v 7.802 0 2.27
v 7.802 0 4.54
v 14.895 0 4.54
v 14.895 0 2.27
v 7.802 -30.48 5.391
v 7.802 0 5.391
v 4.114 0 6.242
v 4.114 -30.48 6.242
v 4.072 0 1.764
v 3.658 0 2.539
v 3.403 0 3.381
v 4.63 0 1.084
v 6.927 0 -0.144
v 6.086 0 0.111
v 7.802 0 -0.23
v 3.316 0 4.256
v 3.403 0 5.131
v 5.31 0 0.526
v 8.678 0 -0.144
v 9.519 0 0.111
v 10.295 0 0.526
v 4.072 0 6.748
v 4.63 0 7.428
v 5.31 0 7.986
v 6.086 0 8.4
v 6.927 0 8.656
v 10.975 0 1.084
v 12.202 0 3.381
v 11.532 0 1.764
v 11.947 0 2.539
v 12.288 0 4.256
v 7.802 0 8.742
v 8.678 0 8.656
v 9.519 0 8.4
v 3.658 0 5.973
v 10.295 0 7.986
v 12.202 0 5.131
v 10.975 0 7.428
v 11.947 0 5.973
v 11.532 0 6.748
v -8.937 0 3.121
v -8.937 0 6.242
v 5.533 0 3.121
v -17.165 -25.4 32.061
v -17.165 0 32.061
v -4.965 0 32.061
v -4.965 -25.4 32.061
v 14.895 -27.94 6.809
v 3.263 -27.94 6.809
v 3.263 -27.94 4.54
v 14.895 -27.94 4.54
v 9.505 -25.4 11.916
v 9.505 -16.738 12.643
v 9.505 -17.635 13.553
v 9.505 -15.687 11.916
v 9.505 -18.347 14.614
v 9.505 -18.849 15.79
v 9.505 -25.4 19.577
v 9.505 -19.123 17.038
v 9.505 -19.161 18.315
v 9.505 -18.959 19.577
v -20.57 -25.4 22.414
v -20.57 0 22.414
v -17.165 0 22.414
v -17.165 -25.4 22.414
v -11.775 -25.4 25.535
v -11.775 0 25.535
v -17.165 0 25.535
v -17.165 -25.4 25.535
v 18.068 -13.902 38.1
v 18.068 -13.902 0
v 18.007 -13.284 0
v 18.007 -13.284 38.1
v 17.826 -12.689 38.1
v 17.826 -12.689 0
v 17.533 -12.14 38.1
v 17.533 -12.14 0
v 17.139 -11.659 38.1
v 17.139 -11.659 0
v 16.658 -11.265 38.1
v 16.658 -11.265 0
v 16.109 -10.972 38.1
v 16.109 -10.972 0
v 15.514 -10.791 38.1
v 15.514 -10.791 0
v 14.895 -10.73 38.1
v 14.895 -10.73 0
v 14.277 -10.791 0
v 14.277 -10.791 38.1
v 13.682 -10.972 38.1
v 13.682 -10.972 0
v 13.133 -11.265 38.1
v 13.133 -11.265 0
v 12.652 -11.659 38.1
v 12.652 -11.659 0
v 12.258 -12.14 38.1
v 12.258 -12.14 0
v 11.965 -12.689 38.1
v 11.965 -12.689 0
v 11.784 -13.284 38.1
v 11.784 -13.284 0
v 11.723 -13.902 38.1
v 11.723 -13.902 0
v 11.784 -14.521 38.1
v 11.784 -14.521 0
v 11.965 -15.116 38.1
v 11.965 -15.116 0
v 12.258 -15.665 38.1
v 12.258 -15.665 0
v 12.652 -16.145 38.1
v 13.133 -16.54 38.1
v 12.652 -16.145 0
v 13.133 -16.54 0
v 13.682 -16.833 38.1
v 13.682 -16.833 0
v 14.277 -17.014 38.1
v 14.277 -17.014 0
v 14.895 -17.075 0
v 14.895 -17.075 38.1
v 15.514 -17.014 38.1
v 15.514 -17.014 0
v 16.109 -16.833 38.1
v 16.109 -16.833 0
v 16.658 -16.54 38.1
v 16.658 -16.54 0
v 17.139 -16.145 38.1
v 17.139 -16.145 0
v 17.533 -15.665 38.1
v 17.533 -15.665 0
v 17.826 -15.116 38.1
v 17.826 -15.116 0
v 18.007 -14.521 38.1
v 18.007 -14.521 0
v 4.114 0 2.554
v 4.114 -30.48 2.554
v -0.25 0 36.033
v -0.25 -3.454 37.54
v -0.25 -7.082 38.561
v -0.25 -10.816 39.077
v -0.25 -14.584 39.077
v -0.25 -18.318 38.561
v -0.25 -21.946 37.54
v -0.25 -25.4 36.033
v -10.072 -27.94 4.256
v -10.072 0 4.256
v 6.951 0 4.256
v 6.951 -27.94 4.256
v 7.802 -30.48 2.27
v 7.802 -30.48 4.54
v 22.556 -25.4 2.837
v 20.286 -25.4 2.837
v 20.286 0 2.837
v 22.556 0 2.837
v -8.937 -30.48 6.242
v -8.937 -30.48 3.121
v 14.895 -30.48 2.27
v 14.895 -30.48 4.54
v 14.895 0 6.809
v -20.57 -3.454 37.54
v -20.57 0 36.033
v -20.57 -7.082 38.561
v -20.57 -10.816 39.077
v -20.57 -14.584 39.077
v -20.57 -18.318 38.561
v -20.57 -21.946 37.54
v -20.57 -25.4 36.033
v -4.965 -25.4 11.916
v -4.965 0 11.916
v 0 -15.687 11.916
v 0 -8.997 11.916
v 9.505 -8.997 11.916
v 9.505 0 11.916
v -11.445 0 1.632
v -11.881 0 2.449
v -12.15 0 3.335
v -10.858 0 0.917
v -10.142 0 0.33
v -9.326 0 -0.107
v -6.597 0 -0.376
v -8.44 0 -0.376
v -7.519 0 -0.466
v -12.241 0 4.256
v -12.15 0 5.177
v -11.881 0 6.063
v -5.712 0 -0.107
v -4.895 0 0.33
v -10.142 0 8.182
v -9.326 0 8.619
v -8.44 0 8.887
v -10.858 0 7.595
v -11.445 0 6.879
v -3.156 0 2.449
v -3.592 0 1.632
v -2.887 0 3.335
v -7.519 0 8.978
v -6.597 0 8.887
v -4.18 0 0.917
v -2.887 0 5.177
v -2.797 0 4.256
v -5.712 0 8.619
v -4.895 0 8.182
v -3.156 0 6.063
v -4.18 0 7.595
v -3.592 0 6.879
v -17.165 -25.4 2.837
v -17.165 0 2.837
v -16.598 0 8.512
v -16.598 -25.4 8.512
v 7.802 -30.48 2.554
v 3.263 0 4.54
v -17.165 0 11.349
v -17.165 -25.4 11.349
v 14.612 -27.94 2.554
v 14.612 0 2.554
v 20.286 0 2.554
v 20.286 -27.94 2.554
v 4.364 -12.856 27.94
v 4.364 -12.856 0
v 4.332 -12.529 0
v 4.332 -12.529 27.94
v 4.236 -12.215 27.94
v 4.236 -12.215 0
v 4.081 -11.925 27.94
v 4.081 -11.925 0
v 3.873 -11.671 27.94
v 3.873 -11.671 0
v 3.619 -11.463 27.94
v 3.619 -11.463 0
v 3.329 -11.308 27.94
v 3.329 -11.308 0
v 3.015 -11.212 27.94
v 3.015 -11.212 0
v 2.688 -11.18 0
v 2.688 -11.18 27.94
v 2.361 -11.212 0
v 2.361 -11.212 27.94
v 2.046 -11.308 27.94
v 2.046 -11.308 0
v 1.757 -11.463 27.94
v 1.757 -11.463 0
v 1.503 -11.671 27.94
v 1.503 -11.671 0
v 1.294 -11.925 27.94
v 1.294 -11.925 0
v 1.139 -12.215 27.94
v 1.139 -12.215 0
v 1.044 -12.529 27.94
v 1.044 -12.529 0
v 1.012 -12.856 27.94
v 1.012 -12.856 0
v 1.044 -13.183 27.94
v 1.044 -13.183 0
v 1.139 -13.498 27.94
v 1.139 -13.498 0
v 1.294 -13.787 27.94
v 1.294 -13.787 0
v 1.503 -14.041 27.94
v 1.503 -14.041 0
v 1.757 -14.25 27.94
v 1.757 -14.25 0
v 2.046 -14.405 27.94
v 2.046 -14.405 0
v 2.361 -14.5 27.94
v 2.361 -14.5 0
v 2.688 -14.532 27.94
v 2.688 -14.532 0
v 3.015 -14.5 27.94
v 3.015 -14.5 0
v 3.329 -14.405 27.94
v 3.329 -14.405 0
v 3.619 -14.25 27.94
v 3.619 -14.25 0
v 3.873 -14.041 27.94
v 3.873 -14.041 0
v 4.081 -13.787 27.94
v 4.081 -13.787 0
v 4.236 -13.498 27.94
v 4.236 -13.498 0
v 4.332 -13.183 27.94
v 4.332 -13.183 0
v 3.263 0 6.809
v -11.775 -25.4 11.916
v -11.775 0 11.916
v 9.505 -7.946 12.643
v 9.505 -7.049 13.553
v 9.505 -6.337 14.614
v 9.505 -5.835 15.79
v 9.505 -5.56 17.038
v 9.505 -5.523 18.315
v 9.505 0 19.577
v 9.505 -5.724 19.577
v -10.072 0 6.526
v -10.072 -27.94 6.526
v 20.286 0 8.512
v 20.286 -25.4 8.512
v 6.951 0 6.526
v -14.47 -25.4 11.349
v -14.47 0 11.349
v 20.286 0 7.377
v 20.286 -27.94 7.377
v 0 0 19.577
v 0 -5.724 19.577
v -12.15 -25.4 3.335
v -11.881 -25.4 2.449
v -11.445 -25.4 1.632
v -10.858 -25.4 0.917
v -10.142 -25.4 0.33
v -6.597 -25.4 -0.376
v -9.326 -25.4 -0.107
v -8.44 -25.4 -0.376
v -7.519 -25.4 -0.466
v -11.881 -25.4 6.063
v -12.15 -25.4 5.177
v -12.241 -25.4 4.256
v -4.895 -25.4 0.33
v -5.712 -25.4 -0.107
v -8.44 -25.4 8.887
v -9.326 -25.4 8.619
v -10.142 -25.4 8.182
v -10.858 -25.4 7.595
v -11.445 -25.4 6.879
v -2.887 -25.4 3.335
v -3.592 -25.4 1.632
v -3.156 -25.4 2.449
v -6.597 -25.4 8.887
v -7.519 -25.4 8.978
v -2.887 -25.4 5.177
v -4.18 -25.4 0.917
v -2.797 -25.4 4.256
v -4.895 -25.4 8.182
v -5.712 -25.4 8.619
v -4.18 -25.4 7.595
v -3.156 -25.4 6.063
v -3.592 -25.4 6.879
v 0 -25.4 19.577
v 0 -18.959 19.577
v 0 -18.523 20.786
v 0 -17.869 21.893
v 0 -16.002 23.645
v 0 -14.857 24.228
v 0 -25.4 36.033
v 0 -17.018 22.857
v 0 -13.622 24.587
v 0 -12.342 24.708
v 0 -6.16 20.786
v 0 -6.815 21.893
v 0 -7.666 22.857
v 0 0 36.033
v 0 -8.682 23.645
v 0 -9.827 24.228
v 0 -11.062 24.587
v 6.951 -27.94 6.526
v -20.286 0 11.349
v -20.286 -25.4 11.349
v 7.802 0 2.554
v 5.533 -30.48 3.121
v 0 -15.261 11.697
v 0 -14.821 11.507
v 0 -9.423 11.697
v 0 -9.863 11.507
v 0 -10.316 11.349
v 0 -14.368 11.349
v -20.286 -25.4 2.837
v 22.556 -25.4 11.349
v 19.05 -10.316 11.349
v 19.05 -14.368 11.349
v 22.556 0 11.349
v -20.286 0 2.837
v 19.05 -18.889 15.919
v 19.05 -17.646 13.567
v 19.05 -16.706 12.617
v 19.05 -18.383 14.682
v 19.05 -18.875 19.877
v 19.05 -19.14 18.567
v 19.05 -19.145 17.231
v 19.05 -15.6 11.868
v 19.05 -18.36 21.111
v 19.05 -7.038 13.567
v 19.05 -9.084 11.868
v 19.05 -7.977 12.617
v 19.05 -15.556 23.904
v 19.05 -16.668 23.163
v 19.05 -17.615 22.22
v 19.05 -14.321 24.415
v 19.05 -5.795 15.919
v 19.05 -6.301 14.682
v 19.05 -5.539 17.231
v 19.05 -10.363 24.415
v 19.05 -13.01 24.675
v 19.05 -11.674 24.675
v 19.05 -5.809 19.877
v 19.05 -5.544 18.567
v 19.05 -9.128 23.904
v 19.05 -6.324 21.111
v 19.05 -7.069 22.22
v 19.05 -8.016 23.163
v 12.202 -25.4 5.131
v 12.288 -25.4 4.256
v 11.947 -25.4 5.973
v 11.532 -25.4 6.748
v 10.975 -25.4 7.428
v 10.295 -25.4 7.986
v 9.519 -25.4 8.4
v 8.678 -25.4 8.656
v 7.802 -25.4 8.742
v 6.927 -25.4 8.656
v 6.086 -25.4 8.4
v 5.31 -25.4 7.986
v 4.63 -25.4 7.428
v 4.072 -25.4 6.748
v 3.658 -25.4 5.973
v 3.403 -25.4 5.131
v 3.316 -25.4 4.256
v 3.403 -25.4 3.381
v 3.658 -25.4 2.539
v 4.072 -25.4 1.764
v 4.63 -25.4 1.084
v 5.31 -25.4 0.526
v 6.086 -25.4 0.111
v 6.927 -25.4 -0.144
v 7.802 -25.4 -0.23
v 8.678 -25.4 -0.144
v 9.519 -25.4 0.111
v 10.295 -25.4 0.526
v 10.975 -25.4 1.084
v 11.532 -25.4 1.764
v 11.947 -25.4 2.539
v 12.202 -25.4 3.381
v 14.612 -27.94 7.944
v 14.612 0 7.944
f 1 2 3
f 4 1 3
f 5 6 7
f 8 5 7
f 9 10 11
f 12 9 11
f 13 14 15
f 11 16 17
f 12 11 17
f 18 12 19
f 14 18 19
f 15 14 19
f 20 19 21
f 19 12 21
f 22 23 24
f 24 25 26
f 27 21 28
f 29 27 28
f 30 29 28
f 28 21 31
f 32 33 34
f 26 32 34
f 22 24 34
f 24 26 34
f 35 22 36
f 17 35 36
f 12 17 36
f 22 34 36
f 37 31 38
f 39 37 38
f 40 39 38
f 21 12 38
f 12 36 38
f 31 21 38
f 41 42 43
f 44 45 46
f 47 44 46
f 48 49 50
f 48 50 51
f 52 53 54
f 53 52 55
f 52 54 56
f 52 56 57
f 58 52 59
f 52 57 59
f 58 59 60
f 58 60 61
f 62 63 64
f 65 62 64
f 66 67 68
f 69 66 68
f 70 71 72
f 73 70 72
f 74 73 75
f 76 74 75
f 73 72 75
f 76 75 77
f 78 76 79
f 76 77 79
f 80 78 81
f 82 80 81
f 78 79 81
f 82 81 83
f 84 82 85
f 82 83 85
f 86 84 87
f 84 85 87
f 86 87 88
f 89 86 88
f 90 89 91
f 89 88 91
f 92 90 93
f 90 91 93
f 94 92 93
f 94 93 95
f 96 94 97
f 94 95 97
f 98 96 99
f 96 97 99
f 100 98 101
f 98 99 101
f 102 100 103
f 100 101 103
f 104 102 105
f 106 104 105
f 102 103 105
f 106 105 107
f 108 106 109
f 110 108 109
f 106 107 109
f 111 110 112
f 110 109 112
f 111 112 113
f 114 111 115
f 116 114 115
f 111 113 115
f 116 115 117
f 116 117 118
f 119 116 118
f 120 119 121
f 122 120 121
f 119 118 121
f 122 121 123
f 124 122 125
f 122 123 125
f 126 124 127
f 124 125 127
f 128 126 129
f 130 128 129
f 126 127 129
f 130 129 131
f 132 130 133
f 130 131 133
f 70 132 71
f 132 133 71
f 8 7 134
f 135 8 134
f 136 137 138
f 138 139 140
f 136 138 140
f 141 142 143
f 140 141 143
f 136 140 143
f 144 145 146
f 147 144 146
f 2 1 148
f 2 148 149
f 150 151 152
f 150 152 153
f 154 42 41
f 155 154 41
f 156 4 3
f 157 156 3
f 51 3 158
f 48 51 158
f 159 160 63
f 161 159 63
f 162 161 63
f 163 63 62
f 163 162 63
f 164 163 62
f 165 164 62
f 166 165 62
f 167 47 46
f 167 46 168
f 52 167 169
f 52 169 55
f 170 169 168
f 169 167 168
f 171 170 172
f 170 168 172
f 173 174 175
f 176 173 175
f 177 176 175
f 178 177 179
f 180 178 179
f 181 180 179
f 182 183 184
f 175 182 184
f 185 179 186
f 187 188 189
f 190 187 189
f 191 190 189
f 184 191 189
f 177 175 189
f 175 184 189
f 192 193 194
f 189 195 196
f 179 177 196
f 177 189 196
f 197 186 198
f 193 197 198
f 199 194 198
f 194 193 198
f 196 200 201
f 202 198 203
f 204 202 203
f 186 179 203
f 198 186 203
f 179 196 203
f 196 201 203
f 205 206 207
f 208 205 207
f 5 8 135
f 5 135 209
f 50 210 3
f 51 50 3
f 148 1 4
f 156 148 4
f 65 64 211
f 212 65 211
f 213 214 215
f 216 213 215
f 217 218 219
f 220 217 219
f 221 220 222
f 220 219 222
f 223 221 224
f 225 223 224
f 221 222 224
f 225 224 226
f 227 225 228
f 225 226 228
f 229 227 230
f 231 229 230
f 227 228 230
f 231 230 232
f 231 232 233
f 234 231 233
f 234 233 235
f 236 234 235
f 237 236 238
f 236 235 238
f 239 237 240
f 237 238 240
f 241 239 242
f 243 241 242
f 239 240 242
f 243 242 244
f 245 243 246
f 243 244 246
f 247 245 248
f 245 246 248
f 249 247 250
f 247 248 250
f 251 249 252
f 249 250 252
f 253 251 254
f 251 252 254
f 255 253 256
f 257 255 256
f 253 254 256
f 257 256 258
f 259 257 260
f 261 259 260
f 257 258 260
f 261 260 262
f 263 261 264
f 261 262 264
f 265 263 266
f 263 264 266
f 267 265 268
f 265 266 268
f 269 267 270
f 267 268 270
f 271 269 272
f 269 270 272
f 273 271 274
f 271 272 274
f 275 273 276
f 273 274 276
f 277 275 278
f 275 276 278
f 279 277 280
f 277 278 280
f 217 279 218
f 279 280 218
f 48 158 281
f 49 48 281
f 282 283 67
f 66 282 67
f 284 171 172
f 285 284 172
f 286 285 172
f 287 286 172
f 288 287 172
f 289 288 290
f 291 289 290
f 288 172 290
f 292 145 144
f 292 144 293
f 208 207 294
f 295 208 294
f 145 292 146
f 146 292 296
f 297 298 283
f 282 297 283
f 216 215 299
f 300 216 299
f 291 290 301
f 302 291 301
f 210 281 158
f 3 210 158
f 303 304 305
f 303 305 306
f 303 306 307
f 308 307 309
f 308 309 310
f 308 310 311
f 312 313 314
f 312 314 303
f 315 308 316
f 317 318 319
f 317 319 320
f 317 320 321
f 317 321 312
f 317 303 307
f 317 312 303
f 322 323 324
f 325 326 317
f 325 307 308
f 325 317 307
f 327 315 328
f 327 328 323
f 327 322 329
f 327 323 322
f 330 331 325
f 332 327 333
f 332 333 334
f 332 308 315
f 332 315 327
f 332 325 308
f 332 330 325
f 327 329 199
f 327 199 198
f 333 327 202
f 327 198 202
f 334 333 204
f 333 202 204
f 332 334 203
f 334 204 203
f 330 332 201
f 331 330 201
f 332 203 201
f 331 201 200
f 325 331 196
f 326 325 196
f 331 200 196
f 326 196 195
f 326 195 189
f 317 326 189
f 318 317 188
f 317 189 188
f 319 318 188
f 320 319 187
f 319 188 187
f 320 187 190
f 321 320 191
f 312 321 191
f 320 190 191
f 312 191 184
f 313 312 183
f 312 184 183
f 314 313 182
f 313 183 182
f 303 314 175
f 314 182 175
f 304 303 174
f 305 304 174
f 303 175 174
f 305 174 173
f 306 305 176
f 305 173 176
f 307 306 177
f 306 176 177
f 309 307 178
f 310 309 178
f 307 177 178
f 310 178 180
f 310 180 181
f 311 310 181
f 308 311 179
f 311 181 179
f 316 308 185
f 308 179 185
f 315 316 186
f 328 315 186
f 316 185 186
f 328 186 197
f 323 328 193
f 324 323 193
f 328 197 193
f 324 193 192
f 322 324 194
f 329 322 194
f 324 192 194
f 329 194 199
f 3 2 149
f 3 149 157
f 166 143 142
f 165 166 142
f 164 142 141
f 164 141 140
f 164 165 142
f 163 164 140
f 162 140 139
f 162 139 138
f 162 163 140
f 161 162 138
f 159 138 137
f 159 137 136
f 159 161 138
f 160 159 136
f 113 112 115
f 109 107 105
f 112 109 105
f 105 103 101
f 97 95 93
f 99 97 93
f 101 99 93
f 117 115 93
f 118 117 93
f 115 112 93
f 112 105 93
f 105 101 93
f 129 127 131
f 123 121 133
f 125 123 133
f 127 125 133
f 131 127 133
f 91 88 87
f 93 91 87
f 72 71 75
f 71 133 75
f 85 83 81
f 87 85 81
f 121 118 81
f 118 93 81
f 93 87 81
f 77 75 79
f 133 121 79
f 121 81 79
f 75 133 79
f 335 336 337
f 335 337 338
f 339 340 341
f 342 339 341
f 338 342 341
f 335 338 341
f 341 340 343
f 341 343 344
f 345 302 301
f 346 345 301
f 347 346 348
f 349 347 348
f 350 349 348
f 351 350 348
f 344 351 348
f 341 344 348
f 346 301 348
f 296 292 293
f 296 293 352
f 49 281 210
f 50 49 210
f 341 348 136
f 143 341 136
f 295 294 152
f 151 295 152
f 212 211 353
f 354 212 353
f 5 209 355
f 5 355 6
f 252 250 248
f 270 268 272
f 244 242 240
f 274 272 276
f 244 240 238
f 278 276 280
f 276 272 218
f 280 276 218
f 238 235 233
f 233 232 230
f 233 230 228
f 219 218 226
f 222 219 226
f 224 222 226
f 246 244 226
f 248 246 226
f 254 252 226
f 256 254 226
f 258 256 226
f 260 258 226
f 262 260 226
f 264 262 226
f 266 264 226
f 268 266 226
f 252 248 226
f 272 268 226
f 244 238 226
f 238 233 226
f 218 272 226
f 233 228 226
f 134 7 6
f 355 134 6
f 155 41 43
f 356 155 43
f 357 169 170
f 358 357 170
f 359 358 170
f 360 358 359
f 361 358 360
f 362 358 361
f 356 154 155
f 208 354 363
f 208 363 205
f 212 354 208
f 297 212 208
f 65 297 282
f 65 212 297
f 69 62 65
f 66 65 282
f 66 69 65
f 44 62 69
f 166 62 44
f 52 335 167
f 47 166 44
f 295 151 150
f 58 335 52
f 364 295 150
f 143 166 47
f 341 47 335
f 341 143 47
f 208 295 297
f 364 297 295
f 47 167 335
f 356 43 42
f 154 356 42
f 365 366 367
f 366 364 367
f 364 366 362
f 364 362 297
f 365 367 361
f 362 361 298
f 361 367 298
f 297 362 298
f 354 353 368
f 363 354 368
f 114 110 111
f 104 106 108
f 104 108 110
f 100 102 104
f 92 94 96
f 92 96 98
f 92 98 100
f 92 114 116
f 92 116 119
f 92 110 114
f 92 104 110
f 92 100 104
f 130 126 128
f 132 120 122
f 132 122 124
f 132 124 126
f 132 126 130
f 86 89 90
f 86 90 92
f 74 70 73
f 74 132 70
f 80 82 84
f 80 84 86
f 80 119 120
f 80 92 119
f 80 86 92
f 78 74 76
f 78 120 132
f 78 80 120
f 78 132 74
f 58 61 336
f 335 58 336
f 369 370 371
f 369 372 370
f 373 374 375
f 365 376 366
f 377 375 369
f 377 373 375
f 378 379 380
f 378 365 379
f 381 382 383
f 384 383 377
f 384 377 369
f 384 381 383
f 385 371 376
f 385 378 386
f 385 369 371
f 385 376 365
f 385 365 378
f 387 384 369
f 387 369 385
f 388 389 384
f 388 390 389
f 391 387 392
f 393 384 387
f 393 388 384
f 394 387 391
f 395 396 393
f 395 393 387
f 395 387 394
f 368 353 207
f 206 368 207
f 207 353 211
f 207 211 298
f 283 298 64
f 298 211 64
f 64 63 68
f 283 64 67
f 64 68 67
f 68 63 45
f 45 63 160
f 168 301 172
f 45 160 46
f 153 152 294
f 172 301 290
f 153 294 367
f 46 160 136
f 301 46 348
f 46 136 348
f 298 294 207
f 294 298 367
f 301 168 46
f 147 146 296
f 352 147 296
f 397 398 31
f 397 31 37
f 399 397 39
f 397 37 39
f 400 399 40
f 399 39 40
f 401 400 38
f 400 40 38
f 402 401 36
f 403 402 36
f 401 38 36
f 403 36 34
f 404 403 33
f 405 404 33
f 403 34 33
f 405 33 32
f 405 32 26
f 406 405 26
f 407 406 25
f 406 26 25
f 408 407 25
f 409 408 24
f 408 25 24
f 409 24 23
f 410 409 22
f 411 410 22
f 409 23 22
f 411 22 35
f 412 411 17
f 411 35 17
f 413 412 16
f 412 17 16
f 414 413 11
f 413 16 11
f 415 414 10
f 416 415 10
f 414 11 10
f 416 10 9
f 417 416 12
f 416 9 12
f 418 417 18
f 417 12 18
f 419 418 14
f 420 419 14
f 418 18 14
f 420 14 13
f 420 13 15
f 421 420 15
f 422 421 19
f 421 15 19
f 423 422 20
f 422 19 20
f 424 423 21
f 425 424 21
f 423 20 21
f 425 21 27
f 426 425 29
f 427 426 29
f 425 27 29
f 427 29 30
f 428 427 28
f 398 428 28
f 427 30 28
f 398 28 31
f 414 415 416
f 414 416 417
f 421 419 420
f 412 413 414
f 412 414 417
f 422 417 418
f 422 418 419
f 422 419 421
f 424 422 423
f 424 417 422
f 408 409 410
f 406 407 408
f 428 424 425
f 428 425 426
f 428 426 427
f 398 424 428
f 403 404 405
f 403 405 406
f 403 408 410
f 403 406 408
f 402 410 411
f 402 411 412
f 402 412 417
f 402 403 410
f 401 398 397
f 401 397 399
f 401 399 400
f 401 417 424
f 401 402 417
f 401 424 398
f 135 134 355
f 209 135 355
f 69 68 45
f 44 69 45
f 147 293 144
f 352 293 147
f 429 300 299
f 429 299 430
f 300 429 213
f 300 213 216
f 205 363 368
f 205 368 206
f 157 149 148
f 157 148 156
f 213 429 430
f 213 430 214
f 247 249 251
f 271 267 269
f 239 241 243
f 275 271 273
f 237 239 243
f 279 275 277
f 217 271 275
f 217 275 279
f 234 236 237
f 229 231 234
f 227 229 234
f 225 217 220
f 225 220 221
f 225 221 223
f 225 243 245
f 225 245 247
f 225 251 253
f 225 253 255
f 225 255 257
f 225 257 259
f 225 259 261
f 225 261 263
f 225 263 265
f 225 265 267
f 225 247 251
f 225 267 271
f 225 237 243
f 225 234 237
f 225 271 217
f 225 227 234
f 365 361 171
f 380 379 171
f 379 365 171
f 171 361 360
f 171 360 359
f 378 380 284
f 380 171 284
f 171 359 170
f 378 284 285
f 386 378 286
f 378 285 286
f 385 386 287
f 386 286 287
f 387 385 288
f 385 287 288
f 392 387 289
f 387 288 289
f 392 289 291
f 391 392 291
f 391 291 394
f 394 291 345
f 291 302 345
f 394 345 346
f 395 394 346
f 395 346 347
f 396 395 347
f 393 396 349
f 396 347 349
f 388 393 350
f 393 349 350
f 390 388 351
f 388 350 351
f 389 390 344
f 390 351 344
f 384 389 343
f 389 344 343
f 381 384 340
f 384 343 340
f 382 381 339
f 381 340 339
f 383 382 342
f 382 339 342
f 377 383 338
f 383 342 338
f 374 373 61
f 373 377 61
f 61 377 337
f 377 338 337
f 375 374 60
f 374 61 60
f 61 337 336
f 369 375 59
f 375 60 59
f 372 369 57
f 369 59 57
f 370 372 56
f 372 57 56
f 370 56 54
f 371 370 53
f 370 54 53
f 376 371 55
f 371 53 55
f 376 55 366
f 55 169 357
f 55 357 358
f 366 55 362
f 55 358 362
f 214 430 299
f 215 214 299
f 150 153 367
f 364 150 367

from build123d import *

# Parameters (mm, degrees)
F0_R      = 4.486061
F0_R_2    = 4.722098
F1_DEPTH  = 25.4
F3_DEPTH  = 25.4
F5_DEPTH  = 25.4
F6_R      = 6.832964
F7_DEPTH  = 19.05
F8_R      = 3.172124
F9_DEPTH  = 38.1
F11_DEPTH = 27.94
F12_W     = 17.023406
F12_H     = 2.269788
F13_DEPTH = 27.94
F15_DEPTH = 27.94
F17_DEPTH = 30.48
F18_W     = 7.093086
F18_H     = 2.269787
F19_DEPTH = 30.48
F21_DEPTH = 30.48
F22_R     = 1.676019
F23_DEPTH = 27.94
F25_DEPTH = 20.32


with BuildPart() as f1:
    # F0 (on Front) → F1 (new body)
    with BuildSketch(Plane.XZ):
        with Locations((7.802393, 4.255851)):
            Circle(F0_R)
        with Locations((-7.518671, 4.255851)):
            Circle(F0_R_2)
    extrude(amount=F1_DEPTH)


with BuildPart() as f3:
    # F2 (on Front) → F3 (new body)
    with BuildSketch(Plane.XZ):
        Polygon((-17.165266, 2.837234), (-16.59782, 8.511703), (20.286225, 8.511703), (20.286225, 2.837234), (22.556009, 2.837234), (22.556009, 11.348937), (-20.286223, 11.348937), (-20.286223, 2.837234), align=None)
    extrude(amount=F3_DEPTH)

    # F4 (on Front) → F5 (join)
    with BuildSketch(Plane.XZ):
        Polygon((-17.165266, 22.414148), (-17.165266, 10.781489), (-11.774521, 11.916383), (-11.774521, 25.535107), (-17.165266, 25.535107), (-17.165266, 32.060746), (-4.965159, 32.060746), (-4.965159, 11.916383), (9.504734, 11.916383), (9.504734, 19.576915), (0, 19.576915), (0, 36.032874), (-20.569947, 36.032874), (-20.569947, 22.414148), align=None)
    extrude(amount=F5_DEPTH)

    # F6 (on Right) → F7 (join)
    with BuildSketch(Plane.YZ):
        with Locations((-12.341968, 17.874574)):
            Circle(F6_R)
    extrude(amount=F7_DEPTH)

    # F24 (on face) → F25 (join)
    with BuildSketch(Plane(origin=(-20.569947, 0, 0), x_dir=(0, -1, 0), z_dir=(-1, 0, 0))):
        with BuildLine():
            Line((0, 36.032874), (25.4, 36.032874))
            ThreePointArc((25.4, 36.032874), (12.7, 39.141446), (0, 36.032874))
        make_face()
    extrude(amount=-F25_DEPTH)


with BuildPart() as f9:
    # F8 (on Top) → F9 (new body)
    with BuildSketch(Plane.XY):
        with Locations((14.895479, -13.902447)):
            Circle(F8_R)
    extrude(amount=F9_DEPTH)


with BuildPart() as f11:
    # F10 (on Front) → F11 (new body)
    with BuildSketch(Plane.XZ):
        Polygon((20.286225, 2.553511), (20.286225, 7.376809), (14.611756, 7.944255), (14.611756, 2.553511), align=None)
    extrude(amount=F11_DEPTH)


with BuildPart() as f13:
    # F12 (on Front) → F13 (new body)
    with BuildSketch(Plane.XZ):
        with Locations((-1.560478, 5.390745)):
            Rectangle(F12_W, F12_H)
    extrude(amount=F13_DEPTH)


with BuildPart() as f15:
    # F14 (on Front) → F15 (new body)
    with BuildSketch(Plane.XZ):
        Polygon((14.895479, 4.539574), (14.895479, 6.809362), (3.262819, 6.809362), (3.262819, 4.539574), (12.058245, 4.539574), align=None)
    extrude(amount=F15_DEPTH)


with BuildPart() as f17:
    # F16 (on Front) → F17 (new body)
    with BuildSketch(Plane.XZ):
        Polygon((7.802393, 5.390745), (4.11399, 6.241915), (4.11399, 2.553511), (7.802393, 2.553511), align=None)
    extrude(amount=F17_DEPTH)


with BuildPart() as f19:
    # F18 (on Front) → F19 (new body)
    with BuildSketch(Plane.XZ):
        with Locations((11.348936, 3.40468)):
            Rectangle(F18_W, F18_H)
    extrude(amount=F19_DEPTH)


with BuildPart() as f21:
    # F20 (on Front) → F21 (new body)
    with BuildSketch(Plane.XZ):
        Polygon((5.532607, 3.120958), (-8.937288, 6.241915), (-8.937288, 3.120958), align=None)
    extrude(amount=F21_DEPTH)


with BuildPart() as f23:
    # F22 (on Top) → F23 (new body)
    with BuildSketch(Plane.XY):
        with Locations((2.687858, -12.856173)):
            Circle(F22_R)
    extrude(amount=F23_DEPTH)


solid = Compound([f1.part, f3.part, f9.part, f11.part, f13.part, f15.part, f17.part, f19.part, f21.part, f23.part])
